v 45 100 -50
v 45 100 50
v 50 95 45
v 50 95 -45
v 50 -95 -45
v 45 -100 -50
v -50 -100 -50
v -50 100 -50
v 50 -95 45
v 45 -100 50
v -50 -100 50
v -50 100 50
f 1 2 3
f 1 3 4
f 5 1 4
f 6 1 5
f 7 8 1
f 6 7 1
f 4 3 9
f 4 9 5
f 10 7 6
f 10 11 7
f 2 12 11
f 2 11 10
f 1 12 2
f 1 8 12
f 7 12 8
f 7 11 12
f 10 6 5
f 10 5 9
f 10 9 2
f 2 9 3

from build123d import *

# Parameters (mm, degrees)
F0_W      = 100
F0_H      = 100
F1_DEPTH  = 100
F1_FACE_W = 100
F1_FACE_H = 100
F2_DEPTH  = 100
F3_SIZE   = 5


with BuildPart() as f1:
    # F0 (on Front) → F1 (new body)
    with BuildSketch(Plane.XZ):
        Rectangle(F0_W, F0_H)
    extrude(amount=F1_DEPTH)

    # F1_face (on face) → F2 (join)
    with BuildSketch(Plane(origin=(0, 0, 0), x_dir=(1, 0, 0), z_dir=(0, 1, 0))):
        Rectangle(F1_FACE_W, F1_FACE_H)
    extrude(amount=F2_DEPTH)

    # F3
    f3_edges = [f1.edges().sort_by_distance(p)[0] for p in [
        (50, 0, 50),
        (50, -100, 0),
        (50, 0, -50),
        (50, 100, 0),
    ]]
    chamfer(f3_edges, length=F3_SIZE)


solid = f1.part
